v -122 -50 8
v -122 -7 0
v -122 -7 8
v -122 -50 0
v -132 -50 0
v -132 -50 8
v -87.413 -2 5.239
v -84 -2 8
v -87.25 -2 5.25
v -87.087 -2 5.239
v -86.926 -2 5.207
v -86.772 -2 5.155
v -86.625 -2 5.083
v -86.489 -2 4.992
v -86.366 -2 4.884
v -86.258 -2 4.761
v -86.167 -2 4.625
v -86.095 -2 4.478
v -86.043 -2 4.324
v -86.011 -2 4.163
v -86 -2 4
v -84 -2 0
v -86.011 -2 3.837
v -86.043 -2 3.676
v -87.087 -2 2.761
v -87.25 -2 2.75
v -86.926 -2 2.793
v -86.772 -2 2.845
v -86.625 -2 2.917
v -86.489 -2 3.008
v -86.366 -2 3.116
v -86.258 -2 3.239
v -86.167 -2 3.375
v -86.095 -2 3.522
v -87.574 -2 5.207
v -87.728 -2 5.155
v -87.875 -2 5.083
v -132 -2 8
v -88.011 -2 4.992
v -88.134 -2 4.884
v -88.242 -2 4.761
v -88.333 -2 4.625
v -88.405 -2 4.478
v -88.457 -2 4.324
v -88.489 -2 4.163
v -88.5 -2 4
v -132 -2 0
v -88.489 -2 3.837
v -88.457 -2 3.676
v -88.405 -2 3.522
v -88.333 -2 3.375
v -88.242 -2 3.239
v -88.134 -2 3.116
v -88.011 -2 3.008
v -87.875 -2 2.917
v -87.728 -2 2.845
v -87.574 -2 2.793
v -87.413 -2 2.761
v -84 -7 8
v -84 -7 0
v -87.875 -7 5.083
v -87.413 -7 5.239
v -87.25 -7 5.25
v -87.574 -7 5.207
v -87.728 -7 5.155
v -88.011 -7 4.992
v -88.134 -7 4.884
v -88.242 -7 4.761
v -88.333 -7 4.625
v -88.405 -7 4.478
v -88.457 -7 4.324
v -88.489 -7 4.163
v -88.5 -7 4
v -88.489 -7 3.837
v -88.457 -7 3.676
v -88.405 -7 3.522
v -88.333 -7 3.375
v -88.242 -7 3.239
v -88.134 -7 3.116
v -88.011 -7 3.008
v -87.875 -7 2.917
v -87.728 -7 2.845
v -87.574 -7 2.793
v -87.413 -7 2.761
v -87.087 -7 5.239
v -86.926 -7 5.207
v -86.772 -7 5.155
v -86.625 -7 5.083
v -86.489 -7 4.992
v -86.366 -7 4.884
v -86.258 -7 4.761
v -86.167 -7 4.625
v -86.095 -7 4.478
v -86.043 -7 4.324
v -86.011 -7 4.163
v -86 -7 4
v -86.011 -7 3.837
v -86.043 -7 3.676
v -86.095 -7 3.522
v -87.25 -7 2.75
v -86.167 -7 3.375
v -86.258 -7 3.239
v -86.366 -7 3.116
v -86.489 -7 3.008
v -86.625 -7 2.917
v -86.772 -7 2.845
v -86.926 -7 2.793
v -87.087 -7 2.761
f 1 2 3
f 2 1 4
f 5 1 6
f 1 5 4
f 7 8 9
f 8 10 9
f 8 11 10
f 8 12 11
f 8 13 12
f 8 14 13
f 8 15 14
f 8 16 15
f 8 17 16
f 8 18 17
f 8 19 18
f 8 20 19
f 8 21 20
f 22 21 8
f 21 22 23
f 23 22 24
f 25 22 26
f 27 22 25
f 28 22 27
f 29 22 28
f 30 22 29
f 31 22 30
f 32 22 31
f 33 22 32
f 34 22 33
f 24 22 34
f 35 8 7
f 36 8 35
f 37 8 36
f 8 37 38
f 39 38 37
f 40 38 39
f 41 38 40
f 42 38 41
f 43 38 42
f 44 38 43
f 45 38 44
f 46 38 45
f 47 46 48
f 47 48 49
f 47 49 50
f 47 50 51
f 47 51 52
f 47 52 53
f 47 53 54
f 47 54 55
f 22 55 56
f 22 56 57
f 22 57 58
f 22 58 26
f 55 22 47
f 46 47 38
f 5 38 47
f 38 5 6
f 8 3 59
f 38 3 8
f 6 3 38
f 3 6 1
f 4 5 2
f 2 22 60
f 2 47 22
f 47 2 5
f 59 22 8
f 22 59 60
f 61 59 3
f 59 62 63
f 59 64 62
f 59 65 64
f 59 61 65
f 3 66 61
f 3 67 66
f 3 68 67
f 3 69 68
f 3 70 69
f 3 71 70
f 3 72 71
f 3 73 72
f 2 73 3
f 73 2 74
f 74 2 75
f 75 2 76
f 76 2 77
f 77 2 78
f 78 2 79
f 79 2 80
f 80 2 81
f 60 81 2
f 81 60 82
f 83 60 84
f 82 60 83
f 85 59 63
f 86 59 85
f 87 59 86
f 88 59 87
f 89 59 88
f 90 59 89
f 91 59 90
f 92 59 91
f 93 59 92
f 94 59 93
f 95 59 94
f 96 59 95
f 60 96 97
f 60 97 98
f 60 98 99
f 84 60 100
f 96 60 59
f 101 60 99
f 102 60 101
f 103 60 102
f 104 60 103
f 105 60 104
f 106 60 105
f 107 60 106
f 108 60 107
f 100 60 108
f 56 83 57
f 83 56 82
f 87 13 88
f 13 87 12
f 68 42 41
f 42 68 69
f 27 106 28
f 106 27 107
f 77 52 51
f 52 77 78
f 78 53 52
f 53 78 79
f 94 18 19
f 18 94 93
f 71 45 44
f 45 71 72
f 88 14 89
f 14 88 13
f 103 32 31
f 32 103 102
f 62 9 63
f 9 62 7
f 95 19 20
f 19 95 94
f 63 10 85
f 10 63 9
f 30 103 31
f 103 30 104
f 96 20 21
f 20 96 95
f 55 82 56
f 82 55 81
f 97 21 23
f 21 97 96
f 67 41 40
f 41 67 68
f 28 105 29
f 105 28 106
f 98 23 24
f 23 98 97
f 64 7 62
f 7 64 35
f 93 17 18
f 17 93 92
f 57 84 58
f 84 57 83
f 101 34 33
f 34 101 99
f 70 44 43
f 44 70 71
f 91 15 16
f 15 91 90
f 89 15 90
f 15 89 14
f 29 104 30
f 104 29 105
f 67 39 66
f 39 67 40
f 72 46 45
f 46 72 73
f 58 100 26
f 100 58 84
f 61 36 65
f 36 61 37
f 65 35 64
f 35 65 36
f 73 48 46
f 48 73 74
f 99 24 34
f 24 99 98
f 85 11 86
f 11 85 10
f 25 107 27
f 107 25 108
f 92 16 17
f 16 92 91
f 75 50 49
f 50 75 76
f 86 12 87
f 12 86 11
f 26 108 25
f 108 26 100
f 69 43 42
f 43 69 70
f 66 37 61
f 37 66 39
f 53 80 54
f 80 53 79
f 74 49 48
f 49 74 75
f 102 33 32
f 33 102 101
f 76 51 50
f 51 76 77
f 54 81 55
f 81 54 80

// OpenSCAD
// latch.scad -- the release latch (task.py: _latch, _hook_ramp), SUPPLY frame at rest, mm.
//
// Three printed parts, screwed together inside the supply so they slide as one, LATCH_TRAVEL toward the handle (-y):
// PART = "tab"       the release tab (task: TAB) and its link (task: LINK), which runs on through a slot in the face
//                    into the supply, to link_end_x(), riding on the floor. Print lying on its side (8 mm face down).
//        "carriage"  the latch arm: a plate that slides across the supply in the guide channel (front wall and guide
//                    rib, psu_shell.scad), with a socket that drops over the link's end (one M3 screw down into the
//                    link) and two pilot holes for the hook. Print floor down.
//        "hook"      the hook: a post that sits on the carriage's top against the side wall, carrying the square catch
//                    (task: CATCH) and the ramp (task: RAMP_TOP, RAMP_DEG, RAMP_T, RAMP_Z) that stand out through the
//                    window in the supply's left side; two M3 screws down through the post into the carriage. It is a
//                    separate part so it can be slid out through the window after the carriage is in place (the
//                    catch stands out further than the latch's travel). Print upside down (as placed); no supports.
//        "assembly"  all three in place.
// The tab spring (LATCH_RATE, about 1 N/mm) sits in a pocket of the fixed spring block in the tray and pushes on the
// carriage's -y end. Rest stop: the carriage's +y face against the side wall's inner face, below the window (the
// catch then stands CATCH[3] - PSU_W/2 = 5 mm out of the side). Push stop: the carriage's -y end against the spring
// block after LATCH_TRAVEL, which leaves the tab TAB_Y[0] - LATCH_TRAVEL - HANDLE_Y[1] = 1 mm short of the handle, as
// in task.py. Inside the supply the carriage runs FIT_SLIDE above the floor; the outer faces are task.py's.

include <params.scad>

PART = "tab";

INNER = PSU_W / 2 - WALL;                // the side wall's inner face

module tab_link() {
    difference() {
        union() {
            box6(TAB);
            translate([LINK[0] - EPS, LINK[2], LINK[4]])
                cube([link_end_x() - LINK[0] + EPS, LINK[3] - LINK[2], LINK[5] - LINK[4]]);
        }
        translate([link_screw_x(), (LINK[2] + LINK[3]) / 2, LINK[4] - EPS])
            cylinder(h = LINK[5] - LINK[4] + 2 * EPS, d = M3_PILOT);
    }
}

module carriage() {
    x0 = FACE_X + WALL + FIT_SLIDE;
    z0 = FLOOR + FIT_SLIDE;
    difference() {
        translate([x0, CARR_Y0, z0]) cube([CARR_X1 - x0, INNER - CARR_Y0, CARR_TOP - z0]);
        // socket for the link's end (open at the front and below)
        translate([x0 - EPS, LINK[2] - FIT_PRESS, z0 - EPS])
            cube([link_end_x() + FIT_PRESS - x0 + EPS, LINK[3] - LINK[2] + 2 * FIT_PRESS, LINK[5] + FIT_SLIDE - z0 + EPS]);
        // M3 screw down into the link
        translate([link_screw_x(), (LINK[2] + LINK[3]) / 2, LINK[5]])
            cylinder(h = CARR_TOP - LINK[5] + EPS, d = M3_CLEAR);
        // pilots for the hook's screws
        for (x = HOOK_SCREW_X)
            translate([x, INNER - POST_T / 2, CARR_TOP - HOOK_SCREW_DEPTH]) cylinder(h = HOOK_SCREW_DEPTH + EPS, d = M3_PILOT);
    }
}

// task._hook_ramp: a RAMP_T plate whose outer face runs from the crest RAMP_TOP back to the supply's side at
// RAMP_DEG, filled in behind down to the side wall's inner face so it is one solid with the post.
module ramp() {
    x0 = RAMP_TOP[0];
    y0 = RAMP_TOP[1];
    y1 = PSU_W / 2;
    x1 = ramp_tail_x();
    a = atan2(y1 - y0, x1 - x0);
    rl = sqrt(pow(x1 - x0, 2) + pow(y1 - y0, 2));
    nx = -sin(a);
    ny = cos(a);
    cx = (x0 + x1) / 2 - nx * RAMP_T / 2;
    cy = (y0 + y1) / 2 - ny * RAMP_T / 2;
    xf = x0 - RAMP_T * nx;
    hull() {
        translate([cx, cy, RAMP_Z[0]]) rotate([0, 0, a])
            translate([-rl / 2, -RAMP_T / 2, 0]) cube([rl, RAMP_T, RAMP_Z[1] - RAMP_Z[0]]);
        translate([xf, INNER - EPS, RAMP_Z[0]]) cube([x1 - xf, EPS, RAMP_Z[1] - RAMP_Z[0]]);
    }
}

module hook() {
    difference() {
        union() {
            // the post, on the carriage's top
            translate([CATCH[0] - POST_FRONT, INNER - POST_T, CARR_TOP])
                cube([CARR_X1 - (CATCH[0] - POST_FRONT), POST_T, CATCH[5] - CARR_TOP]);
            // the square catch, through the side window
            translate([CATCH[0], INNER - EPS, CATCH[4]])
                cube([CATCH[1] - CATCH[0], CATCH[3] - INNER + EPS, CATCH[5] - CATCH[4]]);
            ramp();
        }
        for (x = HOOK_SCREW_X)
            translate([x, INNER - POST_T / 2, CARR_TOP - EPS]) cylinder(h = CATCH[5] - CARR_TOP + 2 * EPS, d = M3_CLEAR);
    }
}

if (PART == "tab") rotate([90, 0, 0]) translate([0, -TAB[2], 0]) tab_link();
else if (PART == "carriage") translate([0, 0, -(FLOOR + FIT_SLIDE)]) carriage();
else if (PART == "hook") translate([0, 0, CATCH[5]]) rotate([180, 0, 0]) hook();
else if (PART == "assembly") {
    tab_link();
    carriage();
    hook();
}
